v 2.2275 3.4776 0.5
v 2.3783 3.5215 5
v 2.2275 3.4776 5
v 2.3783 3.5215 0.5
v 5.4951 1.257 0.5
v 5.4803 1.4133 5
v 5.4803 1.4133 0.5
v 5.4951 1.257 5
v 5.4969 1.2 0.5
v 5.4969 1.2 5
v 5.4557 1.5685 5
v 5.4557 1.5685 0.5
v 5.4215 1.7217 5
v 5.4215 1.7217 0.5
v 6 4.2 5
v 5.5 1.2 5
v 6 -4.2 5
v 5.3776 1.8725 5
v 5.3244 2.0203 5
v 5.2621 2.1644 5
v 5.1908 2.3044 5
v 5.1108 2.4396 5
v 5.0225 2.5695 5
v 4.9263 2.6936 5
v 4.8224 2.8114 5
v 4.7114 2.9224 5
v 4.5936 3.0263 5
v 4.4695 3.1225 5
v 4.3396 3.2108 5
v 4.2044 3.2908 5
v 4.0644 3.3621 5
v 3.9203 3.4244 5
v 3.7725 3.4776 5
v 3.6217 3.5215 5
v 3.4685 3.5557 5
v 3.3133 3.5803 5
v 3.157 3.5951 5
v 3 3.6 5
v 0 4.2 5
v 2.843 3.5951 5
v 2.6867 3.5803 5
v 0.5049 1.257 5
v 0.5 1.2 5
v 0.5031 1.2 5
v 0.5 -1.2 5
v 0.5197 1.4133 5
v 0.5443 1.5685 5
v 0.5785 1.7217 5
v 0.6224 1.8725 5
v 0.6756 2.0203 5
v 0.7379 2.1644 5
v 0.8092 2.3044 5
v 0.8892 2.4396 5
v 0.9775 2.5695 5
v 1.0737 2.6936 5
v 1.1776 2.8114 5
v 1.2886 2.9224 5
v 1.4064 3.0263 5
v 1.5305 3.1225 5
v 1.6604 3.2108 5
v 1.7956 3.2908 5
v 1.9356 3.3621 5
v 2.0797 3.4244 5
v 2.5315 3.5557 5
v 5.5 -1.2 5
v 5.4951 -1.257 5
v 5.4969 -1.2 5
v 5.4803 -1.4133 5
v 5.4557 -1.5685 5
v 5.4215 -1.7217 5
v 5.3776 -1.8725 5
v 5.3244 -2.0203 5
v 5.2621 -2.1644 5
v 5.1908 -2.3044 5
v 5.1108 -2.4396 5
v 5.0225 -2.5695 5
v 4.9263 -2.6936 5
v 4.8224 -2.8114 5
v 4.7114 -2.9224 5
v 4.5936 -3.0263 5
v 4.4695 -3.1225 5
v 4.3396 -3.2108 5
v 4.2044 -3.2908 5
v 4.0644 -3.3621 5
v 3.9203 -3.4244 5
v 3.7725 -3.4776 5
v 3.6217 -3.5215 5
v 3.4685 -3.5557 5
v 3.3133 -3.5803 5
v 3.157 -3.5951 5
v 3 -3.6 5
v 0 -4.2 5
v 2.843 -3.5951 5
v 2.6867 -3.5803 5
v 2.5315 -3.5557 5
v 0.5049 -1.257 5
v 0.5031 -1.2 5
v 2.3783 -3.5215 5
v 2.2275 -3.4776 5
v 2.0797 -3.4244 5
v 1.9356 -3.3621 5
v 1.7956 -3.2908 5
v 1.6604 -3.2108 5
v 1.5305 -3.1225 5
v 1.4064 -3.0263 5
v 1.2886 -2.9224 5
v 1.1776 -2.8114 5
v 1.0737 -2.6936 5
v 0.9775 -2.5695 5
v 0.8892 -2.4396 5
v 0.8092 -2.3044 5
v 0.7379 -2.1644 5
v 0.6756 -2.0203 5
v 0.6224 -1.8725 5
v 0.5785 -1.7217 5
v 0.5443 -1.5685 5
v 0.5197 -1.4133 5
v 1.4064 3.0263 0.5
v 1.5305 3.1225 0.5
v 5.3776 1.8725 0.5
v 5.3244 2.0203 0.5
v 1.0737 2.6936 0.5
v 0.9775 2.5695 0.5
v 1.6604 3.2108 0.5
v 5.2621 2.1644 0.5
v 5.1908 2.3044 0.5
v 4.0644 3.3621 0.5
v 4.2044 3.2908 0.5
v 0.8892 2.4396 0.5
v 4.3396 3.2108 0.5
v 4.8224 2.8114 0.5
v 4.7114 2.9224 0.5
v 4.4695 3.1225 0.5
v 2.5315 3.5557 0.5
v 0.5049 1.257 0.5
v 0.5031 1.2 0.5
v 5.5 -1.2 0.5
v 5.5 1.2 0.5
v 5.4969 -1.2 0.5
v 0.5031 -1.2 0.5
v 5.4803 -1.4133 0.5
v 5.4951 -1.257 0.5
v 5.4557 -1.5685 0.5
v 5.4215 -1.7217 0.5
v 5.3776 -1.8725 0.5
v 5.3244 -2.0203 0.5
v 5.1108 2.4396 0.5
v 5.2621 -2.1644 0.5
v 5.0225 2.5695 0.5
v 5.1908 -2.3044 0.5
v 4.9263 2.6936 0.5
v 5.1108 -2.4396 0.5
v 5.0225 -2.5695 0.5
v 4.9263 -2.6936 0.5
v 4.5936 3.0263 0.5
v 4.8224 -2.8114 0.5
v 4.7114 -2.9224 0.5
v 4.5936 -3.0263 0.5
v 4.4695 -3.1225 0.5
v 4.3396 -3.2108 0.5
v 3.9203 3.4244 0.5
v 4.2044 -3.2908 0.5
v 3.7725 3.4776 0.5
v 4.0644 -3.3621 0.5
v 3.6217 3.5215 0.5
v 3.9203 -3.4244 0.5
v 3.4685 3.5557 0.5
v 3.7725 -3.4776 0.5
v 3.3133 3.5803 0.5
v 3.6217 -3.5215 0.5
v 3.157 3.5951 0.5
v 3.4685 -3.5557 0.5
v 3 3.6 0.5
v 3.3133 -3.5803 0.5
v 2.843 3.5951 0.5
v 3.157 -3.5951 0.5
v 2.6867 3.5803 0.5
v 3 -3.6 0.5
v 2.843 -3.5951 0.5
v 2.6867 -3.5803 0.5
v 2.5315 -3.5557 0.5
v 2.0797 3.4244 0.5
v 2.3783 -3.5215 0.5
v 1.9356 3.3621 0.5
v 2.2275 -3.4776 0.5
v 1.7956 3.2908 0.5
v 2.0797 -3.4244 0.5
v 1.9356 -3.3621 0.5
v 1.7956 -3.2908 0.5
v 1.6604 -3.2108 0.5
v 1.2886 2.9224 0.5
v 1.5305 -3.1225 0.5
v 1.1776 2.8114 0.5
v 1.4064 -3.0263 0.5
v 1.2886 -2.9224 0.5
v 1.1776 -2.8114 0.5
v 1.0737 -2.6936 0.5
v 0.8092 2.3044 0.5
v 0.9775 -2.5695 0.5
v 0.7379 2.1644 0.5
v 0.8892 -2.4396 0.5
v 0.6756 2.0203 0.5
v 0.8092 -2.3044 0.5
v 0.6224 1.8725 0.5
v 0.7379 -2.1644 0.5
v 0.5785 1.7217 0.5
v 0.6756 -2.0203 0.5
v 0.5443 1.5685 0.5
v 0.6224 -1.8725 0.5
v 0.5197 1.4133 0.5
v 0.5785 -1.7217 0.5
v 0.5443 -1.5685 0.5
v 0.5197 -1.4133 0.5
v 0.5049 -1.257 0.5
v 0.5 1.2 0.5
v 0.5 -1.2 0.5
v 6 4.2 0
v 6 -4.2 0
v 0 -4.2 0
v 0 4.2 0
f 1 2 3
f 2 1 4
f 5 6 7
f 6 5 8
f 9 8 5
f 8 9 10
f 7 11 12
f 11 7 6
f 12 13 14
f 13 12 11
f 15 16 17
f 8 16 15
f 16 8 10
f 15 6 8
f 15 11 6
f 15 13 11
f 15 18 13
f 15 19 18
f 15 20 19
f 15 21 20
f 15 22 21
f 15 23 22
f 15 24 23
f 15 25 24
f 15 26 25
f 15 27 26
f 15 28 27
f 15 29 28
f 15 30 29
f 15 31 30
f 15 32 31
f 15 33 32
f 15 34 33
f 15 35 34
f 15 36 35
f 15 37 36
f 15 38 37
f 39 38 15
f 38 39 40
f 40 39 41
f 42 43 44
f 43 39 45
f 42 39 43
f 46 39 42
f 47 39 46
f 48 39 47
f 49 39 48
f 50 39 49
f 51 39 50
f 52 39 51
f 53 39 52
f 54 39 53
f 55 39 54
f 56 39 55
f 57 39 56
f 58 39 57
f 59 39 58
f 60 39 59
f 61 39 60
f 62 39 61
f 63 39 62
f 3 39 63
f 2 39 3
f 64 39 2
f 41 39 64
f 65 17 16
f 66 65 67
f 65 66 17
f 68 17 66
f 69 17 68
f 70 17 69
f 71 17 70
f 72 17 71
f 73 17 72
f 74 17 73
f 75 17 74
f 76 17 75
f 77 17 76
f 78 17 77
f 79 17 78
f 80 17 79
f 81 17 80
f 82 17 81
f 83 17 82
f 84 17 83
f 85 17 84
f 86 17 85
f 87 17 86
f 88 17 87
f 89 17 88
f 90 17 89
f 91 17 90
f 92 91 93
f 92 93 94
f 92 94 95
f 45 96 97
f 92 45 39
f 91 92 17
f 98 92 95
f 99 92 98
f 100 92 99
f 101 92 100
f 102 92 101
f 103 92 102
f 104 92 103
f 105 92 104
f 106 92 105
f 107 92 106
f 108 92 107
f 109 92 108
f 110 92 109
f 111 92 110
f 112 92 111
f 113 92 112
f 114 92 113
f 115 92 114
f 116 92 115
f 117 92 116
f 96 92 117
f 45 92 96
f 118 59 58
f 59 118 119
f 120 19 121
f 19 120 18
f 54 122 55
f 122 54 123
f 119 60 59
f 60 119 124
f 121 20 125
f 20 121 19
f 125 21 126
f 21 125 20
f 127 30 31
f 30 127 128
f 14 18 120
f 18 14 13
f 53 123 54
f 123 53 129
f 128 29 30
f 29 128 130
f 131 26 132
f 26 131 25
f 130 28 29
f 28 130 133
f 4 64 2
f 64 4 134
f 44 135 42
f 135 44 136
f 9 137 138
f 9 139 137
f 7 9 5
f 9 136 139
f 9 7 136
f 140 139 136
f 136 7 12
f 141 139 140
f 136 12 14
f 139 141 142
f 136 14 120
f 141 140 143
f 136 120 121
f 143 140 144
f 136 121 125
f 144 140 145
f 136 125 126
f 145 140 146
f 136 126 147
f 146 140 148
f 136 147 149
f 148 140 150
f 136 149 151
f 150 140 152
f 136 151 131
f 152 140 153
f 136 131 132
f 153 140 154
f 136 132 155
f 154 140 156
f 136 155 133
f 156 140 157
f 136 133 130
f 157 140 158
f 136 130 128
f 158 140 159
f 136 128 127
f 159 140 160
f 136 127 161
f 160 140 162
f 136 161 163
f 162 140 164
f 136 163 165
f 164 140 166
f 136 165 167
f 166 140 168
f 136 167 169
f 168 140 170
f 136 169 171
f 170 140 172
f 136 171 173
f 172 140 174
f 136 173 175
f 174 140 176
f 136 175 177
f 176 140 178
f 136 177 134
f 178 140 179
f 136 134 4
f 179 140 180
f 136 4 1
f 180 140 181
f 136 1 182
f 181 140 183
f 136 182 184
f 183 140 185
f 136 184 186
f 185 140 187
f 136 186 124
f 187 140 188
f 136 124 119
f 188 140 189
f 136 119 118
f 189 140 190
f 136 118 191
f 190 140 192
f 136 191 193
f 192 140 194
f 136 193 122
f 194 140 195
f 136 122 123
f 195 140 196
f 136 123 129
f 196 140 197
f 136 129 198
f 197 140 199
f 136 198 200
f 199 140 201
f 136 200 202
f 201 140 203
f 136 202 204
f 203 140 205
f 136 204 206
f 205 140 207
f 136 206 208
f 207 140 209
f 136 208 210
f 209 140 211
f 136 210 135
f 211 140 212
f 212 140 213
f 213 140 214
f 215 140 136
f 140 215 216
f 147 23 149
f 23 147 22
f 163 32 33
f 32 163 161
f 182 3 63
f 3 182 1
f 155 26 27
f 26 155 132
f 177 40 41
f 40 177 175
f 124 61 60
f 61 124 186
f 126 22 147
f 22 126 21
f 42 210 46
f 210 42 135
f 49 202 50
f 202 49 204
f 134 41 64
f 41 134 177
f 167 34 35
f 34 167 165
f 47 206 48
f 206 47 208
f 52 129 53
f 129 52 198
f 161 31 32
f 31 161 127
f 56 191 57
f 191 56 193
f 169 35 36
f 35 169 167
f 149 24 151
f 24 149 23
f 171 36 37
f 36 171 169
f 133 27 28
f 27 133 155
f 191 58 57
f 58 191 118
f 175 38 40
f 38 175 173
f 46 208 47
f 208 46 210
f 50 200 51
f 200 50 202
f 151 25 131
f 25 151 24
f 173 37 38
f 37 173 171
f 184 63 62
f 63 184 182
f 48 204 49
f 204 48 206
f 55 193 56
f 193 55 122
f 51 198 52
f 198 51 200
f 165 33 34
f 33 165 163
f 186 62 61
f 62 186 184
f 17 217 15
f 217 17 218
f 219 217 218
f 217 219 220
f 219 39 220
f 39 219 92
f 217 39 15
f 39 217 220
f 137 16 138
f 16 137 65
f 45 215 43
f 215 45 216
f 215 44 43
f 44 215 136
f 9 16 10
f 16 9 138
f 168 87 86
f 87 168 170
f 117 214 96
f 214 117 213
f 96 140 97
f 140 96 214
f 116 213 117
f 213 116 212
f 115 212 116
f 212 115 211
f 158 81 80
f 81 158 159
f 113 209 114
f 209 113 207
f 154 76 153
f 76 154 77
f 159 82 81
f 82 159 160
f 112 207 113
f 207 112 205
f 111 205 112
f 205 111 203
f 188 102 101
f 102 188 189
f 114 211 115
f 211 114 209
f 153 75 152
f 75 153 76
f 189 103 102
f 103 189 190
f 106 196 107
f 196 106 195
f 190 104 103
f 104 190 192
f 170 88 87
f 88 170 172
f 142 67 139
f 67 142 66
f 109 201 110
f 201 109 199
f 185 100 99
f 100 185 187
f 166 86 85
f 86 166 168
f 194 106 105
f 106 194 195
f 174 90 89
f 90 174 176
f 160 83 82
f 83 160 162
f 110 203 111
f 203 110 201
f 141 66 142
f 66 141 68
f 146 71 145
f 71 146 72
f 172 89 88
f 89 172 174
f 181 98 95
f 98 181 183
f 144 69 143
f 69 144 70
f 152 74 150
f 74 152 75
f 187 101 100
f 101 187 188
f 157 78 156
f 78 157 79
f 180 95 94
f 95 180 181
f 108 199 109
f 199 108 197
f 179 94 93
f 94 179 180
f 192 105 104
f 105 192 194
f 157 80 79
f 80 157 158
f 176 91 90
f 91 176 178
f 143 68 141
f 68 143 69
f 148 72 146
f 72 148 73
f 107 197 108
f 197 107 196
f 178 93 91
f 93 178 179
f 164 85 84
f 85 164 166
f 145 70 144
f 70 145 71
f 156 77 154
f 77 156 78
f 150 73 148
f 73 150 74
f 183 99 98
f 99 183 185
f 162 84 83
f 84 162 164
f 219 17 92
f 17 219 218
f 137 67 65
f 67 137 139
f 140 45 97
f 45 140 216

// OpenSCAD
// Thermo coupler for a transistor in a TO-92 package.

{ // Dimensions
  //
  //  +--------+ ----  4.19/3.05
  //  |________| ____
  //  \	       /       2.66/2.13
  //   `______'	 ____
  //

  radius = 5/2;
  total_width_y = 3.7;
  length_x = 2*radius;
  width_y = total_width_y - radius;
  thickness = 0.5;
  height_z = 4.5;

  $fn = 100;
}

module half_cylinder(r, h) {
  difference() {
    cylinder(r=r, h=h);
    translate([-r, -r, 0]) {
      cube([2*r, r, h]);
    }
  }
}

module half() {
  x = length_x + 2*thickness;
  y = total_width_y + thickness;
  z = thickness + height_z;
  difference() {
    cube([x, y, z]);
    translate([thickness, 0, thickness]) {
      cube([length_x, width_y, height_z]);
    }
    translate([thickness + radius, width_y - 0.1, thickness]) {
      half_cylinder(radius, height_z);
    }
  }
}

module part() {
  half();
  translate([length_x + 2*thickness, 0, 0]) {
    rotate([0, 0, 180]) {
      half();
    }
  }
}

part();
